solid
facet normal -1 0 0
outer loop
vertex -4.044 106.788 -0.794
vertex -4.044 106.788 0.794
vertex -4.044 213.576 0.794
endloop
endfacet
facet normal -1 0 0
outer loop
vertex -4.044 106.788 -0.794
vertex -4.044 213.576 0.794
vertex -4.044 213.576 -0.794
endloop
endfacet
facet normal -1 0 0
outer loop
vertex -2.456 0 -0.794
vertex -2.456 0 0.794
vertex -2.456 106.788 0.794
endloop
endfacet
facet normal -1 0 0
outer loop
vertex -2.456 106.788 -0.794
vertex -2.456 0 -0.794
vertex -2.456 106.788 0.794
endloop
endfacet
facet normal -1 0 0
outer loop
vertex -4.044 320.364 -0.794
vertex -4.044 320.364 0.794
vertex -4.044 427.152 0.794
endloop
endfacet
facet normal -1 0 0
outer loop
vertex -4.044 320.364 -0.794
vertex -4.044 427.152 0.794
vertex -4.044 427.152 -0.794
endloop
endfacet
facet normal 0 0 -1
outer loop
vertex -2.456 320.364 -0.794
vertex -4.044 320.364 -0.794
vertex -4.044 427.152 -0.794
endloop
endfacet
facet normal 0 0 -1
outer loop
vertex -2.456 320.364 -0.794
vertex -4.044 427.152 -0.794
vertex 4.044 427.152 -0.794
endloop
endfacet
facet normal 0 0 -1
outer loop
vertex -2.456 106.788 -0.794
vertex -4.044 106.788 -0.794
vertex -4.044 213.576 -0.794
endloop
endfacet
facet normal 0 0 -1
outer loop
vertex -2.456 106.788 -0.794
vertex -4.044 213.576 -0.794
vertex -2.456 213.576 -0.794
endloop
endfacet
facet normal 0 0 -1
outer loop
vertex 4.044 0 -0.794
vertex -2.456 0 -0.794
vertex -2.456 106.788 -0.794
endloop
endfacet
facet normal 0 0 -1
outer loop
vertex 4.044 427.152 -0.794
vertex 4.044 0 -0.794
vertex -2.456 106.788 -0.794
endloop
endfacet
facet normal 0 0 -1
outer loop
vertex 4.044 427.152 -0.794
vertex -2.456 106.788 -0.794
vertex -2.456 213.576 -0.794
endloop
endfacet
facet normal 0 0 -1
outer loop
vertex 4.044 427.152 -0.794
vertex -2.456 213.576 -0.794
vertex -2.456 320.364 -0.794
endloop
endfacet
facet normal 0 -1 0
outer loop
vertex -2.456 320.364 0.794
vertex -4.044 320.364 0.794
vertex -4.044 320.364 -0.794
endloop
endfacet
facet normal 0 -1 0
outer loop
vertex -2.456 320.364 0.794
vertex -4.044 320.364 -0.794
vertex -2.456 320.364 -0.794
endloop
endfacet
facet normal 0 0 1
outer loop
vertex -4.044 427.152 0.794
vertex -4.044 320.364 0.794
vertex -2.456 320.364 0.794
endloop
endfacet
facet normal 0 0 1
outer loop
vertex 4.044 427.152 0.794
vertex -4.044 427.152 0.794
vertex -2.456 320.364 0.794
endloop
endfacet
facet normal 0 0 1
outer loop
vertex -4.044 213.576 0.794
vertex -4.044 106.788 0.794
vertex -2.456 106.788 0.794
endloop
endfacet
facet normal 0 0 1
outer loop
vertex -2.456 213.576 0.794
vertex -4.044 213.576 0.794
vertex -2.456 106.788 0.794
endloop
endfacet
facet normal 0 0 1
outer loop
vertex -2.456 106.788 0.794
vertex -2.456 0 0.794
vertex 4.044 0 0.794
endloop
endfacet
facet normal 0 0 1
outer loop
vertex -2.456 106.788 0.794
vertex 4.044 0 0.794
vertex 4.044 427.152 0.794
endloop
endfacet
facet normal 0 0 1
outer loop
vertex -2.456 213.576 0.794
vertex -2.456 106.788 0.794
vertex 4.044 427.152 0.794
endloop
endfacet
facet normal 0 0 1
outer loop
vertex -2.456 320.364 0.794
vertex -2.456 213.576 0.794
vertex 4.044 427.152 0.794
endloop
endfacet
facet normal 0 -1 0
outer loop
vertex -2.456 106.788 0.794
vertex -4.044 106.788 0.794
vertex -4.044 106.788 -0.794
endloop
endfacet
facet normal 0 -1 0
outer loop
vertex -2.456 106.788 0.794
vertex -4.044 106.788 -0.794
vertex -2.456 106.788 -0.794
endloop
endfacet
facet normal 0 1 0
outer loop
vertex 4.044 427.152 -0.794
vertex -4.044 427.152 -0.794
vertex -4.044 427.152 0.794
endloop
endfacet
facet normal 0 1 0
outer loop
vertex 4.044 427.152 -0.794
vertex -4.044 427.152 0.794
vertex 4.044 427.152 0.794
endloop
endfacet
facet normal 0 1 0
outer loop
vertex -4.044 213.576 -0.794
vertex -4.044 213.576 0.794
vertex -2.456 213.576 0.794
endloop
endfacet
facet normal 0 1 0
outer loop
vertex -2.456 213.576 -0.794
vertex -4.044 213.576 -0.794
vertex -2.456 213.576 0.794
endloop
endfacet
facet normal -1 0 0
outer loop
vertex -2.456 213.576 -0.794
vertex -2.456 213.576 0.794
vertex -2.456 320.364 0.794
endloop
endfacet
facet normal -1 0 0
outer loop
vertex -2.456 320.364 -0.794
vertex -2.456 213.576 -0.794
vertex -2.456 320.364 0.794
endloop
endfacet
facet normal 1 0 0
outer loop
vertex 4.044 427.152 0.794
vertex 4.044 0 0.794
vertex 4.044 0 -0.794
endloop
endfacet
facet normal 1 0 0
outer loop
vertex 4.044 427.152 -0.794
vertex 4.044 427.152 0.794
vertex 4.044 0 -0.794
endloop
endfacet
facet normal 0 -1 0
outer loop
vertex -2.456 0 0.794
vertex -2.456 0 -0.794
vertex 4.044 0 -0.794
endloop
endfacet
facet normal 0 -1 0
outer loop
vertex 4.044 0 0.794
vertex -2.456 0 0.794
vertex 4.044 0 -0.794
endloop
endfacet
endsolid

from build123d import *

# Parameters (mm, degrees)
SKETCH1_W           = 8.0875
SKETCH1_H           = 1.5875
BOSS_EXTRUDE1_DEPTH = 427.1518
SKETCH2_W           = 1.5875
SKETCH2_H           = 106.78795
CUT_EXTRUDE1_DEPTH  = 427.1518


with BuildPart() as part:
    # Sketch1 → Boss-Extrude1 (new body)
    with BuildSketch(Plane(origin=(0, 0, 0), x_dir=(1, 0, 0), z_dir=(0, 1, 0))):
        Rectangle(SKETCH1_W, SKETCH1_H)
    extrude(amount=BOSS_EXTRUDE1_DEPTH)

    # Sketch2 → Cut-Extrude1 (cut)
    with BuildSketch(Plane.XY.offset(0.79375)):
        with Locations((-3.25, 53.393975)):
            Rectangle(SKETCH2_W, SKETCH2_H)
        with Locations((-3.25, 266.969875)):
            Rectangle(SKETCH2_W, SKETCH2_H)
    extrude(amount=-CUT_EXTRUDE1_DEPTH, mode=Mode.SUBTRACT)


solid = part.part
